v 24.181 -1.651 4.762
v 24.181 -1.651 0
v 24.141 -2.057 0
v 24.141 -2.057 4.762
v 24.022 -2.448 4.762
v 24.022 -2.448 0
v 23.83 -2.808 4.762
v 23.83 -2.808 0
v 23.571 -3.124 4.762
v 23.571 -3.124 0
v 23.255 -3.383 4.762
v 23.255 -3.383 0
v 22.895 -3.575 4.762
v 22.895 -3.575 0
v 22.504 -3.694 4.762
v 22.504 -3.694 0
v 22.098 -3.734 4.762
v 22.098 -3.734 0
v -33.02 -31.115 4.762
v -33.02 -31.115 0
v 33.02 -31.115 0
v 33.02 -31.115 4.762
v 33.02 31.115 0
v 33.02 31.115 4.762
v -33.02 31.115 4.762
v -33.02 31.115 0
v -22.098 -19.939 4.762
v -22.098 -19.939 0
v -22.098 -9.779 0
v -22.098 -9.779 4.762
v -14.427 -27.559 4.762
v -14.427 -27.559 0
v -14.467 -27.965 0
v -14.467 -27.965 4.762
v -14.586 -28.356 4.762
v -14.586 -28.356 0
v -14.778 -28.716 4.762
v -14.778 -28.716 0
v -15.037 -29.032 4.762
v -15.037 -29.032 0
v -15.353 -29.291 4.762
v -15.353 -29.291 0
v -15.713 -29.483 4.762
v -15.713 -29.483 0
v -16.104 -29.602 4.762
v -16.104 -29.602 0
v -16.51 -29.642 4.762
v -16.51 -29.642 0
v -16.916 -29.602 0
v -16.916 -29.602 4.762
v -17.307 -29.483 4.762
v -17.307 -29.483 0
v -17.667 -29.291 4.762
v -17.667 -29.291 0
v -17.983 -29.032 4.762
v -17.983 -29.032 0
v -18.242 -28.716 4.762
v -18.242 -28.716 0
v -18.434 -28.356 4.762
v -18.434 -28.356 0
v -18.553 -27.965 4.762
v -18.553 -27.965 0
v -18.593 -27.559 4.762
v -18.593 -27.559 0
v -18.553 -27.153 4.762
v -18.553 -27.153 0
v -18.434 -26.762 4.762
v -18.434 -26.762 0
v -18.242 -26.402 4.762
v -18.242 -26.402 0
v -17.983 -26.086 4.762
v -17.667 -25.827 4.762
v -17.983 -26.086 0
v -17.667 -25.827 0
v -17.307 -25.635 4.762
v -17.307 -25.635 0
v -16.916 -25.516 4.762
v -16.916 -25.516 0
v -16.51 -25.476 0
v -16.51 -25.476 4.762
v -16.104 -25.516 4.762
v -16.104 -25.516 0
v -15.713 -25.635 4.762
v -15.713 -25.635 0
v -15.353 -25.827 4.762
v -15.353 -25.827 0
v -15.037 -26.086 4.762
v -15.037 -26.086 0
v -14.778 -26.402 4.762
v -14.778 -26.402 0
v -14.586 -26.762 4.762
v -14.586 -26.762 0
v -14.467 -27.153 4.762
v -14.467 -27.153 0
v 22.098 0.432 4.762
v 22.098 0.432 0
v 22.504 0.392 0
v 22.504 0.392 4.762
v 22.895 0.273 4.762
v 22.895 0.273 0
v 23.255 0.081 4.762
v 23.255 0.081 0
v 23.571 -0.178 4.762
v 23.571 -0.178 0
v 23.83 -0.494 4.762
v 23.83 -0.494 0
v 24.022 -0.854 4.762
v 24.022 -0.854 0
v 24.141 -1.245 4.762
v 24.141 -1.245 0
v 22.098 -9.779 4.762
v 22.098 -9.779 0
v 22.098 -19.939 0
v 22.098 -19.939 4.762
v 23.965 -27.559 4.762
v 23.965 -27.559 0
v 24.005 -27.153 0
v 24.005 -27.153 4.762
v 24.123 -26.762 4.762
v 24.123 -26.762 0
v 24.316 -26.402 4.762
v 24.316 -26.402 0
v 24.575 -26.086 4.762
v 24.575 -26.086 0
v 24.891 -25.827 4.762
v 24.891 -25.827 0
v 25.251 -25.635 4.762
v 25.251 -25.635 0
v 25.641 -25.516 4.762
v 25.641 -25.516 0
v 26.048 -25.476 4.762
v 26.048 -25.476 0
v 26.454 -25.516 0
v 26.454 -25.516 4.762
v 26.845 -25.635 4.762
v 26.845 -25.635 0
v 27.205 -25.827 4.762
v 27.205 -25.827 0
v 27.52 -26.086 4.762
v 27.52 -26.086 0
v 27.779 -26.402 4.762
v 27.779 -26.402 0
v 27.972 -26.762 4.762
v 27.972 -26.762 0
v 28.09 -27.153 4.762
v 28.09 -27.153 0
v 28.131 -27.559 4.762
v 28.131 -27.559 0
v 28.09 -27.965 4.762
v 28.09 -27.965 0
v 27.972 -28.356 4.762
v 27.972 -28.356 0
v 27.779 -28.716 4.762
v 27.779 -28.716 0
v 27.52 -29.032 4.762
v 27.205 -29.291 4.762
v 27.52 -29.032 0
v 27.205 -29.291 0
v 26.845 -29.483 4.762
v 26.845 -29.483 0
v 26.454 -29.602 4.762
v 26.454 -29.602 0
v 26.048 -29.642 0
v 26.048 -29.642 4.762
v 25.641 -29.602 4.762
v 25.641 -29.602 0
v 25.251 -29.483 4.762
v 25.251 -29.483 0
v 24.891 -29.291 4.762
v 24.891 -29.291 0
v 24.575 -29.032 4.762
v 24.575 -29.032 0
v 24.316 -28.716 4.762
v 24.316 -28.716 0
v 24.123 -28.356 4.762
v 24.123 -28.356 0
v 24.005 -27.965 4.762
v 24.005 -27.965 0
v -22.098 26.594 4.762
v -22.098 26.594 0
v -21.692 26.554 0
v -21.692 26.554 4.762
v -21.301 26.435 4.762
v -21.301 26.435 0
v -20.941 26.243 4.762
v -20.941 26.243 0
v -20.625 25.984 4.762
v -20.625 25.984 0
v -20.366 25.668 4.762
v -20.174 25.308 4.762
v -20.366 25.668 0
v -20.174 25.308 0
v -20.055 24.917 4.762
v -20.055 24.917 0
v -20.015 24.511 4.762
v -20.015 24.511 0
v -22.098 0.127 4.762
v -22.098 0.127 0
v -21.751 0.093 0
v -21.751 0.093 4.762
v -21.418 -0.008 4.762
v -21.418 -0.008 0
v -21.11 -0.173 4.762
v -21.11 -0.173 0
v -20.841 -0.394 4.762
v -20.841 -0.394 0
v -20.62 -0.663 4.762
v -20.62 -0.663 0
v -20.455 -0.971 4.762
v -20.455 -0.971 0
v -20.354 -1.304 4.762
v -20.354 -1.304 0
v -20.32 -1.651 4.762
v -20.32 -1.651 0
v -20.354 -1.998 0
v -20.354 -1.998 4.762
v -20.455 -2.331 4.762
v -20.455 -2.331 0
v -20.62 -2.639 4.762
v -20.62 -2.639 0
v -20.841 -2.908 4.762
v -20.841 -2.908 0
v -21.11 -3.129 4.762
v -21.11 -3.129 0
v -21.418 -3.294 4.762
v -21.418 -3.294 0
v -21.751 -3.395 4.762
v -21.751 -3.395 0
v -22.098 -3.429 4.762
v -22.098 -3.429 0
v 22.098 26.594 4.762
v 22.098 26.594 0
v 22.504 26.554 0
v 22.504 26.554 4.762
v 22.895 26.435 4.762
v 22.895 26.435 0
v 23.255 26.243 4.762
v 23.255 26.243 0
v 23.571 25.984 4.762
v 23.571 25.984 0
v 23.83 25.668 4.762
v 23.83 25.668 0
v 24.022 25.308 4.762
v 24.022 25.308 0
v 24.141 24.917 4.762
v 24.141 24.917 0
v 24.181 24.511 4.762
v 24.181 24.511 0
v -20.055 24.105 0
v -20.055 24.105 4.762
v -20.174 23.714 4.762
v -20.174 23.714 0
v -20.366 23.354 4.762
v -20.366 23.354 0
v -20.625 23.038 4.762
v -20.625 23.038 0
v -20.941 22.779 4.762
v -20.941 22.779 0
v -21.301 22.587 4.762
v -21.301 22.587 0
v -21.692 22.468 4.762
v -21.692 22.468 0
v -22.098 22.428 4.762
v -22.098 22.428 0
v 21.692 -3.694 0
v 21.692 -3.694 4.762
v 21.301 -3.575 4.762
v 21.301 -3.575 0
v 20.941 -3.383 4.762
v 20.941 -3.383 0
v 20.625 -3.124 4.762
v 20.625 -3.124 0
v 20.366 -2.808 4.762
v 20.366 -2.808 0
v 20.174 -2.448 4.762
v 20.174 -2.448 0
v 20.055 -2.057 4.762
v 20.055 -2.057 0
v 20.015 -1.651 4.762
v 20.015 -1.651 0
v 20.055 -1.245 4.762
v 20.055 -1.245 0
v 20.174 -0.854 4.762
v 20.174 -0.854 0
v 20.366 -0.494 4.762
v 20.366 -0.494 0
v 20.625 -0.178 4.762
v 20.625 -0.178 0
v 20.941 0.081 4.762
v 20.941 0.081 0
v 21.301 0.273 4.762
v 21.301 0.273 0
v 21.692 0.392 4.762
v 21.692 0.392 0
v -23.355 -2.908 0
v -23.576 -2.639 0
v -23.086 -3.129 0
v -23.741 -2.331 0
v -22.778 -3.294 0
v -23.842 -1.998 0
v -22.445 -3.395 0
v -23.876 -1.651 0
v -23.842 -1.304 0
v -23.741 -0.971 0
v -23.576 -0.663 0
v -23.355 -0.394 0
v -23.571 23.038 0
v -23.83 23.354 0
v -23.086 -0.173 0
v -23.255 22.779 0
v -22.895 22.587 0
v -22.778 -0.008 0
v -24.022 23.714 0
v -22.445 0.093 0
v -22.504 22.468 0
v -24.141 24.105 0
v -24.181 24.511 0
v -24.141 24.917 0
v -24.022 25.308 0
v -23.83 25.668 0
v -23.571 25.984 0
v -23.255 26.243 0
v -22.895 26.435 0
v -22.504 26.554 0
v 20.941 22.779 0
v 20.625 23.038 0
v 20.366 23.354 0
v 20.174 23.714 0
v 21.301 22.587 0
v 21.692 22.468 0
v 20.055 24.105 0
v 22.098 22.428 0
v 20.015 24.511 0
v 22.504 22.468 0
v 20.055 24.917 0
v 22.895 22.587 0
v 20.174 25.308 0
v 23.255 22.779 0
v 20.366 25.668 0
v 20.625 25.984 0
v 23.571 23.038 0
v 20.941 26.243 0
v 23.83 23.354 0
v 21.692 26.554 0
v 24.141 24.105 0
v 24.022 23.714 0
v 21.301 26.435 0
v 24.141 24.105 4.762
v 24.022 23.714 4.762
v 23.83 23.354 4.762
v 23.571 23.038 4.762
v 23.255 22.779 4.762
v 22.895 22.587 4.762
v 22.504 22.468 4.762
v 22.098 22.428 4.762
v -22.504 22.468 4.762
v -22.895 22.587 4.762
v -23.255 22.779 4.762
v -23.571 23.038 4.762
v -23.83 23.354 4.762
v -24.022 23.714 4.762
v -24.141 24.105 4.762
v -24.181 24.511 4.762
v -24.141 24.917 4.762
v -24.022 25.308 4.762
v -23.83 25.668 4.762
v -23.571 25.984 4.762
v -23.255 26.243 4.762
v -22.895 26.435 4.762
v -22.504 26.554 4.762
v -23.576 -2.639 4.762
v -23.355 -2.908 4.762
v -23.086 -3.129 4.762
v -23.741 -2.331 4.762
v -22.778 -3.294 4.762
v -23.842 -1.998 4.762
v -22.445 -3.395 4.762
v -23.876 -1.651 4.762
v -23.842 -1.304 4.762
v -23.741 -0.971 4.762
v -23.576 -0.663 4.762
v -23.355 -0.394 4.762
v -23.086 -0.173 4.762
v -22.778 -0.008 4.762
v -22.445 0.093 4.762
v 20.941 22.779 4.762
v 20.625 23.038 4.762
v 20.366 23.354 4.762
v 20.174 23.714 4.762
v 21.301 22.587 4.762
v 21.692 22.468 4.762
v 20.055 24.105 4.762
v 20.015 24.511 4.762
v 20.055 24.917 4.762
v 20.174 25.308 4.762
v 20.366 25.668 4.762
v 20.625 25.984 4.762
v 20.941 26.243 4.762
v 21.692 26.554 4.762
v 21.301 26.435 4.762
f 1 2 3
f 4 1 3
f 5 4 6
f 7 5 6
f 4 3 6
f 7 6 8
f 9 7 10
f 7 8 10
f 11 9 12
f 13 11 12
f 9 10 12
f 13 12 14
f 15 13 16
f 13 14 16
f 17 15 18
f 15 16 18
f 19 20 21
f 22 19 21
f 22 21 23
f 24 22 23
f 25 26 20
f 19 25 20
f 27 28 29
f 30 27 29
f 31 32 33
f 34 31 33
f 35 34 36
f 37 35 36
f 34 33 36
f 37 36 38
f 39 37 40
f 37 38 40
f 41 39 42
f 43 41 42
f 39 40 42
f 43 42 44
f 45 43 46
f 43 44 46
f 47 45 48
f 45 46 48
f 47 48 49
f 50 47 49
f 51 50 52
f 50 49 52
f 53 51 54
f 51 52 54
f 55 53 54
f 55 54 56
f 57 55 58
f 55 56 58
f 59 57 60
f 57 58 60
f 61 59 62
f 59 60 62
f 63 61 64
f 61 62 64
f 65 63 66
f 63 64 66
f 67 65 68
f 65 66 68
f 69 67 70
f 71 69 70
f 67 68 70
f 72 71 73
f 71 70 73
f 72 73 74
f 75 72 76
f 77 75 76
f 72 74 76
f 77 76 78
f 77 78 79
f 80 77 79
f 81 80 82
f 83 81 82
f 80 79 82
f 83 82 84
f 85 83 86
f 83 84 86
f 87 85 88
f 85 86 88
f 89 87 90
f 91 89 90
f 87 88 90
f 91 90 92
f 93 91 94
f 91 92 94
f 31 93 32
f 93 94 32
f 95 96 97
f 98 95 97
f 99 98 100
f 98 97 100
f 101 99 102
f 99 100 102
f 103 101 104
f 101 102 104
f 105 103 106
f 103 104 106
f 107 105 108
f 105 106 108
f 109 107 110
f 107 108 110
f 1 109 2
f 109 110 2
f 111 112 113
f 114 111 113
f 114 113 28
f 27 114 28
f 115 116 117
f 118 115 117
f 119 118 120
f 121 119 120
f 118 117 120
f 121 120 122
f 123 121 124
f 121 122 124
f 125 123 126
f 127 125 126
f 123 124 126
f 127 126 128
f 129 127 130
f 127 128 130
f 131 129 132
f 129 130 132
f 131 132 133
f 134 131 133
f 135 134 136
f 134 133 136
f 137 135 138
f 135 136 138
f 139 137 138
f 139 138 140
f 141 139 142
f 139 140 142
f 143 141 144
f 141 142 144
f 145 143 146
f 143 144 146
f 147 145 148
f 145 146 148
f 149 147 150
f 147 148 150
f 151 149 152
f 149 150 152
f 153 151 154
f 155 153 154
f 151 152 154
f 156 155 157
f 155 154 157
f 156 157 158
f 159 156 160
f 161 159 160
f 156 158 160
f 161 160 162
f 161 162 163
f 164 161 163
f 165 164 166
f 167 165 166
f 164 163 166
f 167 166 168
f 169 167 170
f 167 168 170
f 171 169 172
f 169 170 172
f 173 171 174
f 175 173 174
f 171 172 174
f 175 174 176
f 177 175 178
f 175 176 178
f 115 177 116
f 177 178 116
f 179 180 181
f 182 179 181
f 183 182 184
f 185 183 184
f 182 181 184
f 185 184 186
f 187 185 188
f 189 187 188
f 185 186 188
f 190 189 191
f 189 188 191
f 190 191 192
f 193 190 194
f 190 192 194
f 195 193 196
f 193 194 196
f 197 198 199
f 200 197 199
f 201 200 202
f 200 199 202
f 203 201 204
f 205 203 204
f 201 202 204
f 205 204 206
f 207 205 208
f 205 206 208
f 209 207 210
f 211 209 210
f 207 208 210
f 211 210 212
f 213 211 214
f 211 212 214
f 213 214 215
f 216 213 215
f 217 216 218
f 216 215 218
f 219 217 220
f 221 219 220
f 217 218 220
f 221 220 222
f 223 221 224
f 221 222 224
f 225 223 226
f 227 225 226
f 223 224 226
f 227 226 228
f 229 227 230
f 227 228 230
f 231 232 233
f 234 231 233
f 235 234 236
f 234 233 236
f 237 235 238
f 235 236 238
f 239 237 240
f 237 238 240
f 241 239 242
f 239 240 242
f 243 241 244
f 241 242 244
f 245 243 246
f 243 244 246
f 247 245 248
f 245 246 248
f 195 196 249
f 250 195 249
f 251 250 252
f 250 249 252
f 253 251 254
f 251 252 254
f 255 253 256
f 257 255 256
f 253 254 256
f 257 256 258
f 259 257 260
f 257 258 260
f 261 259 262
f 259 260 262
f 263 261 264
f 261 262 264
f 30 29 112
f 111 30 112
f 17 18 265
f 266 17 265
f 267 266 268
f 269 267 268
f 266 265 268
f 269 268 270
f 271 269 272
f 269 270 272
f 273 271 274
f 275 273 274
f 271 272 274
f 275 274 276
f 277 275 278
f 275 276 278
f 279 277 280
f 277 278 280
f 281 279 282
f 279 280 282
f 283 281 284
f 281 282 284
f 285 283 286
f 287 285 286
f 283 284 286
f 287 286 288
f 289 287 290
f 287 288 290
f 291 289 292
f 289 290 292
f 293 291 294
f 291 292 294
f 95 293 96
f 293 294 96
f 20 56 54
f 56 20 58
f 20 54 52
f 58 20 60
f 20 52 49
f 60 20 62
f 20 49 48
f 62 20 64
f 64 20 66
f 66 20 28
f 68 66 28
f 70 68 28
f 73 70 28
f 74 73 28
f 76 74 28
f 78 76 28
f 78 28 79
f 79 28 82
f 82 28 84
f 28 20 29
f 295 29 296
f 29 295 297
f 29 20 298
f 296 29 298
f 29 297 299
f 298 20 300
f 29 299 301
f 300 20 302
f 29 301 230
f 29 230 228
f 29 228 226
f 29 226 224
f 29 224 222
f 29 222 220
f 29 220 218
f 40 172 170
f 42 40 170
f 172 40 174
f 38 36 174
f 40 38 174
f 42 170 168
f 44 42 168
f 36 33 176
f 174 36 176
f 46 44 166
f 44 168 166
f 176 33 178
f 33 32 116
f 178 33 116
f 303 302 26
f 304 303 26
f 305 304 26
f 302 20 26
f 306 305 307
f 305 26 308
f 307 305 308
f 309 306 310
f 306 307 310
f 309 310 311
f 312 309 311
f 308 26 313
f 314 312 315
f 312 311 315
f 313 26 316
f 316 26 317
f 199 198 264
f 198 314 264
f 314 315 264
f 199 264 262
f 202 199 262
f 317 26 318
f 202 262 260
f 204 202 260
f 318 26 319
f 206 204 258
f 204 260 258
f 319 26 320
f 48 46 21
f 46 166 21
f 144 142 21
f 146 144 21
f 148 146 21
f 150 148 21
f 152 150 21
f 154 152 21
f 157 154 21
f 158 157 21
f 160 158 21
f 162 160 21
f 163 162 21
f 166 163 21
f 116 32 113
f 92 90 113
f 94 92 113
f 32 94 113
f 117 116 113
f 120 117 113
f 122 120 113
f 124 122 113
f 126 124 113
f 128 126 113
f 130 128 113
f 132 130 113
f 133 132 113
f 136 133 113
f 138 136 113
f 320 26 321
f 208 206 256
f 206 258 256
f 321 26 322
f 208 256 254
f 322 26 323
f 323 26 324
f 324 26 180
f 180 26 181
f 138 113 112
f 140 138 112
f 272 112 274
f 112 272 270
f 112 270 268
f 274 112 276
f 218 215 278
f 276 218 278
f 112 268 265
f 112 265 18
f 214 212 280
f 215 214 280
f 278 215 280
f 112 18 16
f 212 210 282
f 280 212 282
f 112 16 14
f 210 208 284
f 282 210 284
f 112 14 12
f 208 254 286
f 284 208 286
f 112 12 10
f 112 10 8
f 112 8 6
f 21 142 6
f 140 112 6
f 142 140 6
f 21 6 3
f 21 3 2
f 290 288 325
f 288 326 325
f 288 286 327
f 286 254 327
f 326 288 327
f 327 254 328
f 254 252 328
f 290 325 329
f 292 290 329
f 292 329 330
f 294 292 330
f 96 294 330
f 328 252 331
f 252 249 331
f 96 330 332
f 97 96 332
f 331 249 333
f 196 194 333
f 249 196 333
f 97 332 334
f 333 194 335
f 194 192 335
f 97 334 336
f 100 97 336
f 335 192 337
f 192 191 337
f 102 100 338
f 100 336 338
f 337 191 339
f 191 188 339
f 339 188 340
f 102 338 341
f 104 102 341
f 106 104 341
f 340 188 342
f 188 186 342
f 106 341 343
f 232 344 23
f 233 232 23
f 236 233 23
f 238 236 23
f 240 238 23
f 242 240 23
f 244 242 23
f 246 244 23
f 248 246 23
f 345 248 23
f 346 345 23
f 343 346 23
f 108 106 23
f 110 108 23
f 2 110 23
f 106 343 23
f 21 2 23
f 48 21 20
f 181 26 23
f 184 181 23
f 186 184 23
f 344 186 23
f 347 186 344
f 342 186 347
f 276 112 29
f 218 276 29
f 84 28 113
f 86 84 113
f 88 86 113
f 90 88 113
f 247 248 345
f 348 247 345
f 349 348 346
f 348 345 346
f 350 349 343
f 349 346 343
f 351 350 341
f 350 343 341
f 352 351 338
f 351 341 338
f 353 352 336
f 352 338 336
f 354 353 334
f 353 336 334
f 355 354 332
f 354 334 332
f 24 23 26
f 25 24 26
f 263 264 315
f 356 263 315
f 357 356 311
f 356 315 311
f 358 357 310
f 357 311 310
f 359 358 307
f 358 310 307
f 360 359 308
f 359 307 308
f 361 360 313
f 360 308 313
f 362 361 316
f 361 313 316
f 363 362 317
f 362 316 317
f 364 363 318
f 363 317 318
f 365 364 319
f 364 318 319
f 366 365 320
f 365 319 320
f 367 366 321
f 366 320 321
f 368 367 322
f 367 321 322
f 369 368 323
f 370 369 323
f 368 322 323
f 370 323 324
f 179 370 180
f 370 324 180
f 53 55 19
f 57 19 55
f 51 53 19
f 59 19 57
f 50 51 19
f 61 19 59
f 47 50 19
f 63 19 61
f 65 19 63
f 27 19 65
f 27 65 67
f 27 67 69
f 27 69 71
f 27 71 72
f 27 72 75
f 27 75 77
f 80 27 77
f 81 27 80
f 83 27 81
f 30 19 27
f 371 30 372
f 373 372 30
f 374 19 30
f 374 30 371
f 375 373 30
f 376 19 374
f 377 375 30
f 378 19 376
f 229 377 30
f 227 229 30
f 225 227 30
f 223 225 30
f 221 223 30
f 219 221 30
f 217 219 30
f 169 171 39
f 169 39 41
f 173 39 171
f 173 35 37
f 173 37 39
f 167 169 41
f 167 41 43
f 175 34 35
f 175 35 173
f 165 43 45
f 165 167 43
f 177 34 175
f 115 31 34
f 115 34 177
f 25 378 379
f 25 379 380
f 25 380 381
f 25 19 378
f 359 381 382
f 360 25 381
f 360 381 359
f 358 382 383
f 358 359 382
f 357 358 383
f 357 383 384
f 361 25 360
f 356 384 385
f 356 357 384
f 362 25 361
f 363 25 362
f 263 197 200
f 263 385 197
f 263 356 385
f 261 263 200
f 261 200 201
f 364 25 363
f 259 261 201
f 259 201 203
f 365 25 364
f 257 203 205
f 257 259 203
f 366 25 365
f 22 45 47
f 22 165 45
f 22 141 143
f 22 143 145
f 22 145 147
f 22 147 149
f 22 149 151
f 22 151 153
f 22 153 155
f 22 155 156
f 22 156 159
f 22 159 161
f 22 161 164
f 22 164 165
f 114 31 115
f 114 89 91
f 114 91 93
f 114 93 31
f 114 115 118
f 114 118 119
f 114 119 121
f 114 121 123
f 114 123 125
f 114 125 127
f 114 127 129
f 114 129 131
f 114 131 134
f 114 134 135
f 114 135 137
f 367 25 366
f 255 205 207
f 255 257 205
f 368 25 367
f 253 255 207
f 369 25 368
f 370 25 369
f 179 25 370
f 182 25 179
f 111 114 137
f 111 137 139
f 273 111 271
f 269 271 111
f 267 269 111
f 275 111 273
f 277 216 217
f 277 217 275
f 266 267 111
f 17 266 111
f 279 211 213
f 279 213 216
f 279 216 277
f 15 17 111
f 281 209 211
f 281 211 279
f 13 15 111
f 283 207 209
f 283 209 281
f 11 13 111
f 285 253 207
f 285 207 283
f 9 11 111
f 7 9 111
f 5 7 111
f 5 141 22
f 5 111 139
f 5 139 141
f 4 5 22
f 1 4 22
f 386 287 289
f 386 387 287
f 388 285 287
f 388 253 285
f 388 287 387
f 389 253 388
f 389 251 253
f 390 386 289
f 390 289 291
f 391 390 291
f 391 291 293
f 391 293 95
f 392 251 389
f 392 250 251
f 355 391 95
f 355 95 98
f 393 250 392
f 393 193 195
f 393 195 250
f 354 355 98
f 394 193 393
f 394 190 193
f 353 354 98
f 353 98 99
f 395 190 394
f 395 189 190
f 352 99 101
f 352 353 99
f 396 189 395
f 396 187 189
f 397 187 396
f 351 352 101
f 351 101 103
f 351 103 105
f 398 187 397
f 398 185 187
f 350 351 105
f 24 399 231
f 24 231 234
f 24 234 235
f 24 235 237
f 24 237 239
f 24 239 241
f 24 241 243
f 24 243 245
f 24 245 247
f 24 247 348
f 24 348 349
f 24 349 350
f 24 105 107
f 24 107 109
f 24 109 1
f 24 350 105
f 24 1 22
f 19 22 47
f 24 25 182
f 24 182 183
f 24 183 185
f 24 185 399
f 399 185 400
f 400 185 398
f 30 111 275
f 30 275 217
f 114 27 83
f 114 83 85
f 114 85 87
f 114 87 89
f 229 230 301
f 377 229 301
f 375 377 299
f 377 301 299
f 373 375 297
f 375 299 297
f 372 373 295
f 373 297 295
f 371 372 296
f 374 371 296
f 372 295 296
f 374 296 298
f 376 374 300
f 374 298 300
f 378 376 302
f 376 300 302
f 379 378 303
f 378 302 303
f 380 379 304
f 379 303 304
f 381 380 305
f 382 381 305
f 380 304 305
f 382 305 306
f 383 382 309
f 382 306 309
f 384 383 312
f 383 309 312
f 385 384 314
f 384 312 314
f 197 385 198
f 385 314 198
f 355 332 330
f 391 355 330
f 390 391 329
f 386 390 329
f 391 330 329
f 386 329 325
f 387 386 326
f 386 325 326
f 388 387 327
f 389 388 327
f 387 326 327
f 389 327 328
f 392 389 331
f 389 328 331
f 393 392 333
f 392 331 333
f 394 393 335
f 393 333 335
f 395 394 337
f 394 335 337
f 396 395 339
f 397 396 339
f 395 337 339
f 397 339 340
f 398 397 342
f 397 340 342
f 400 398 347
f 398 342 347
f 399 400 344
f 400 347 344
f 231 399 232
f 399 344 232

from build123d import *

# Parameters (mm, degrees)
F1_DEPTH = 4.7625


# Not quite as in the source:
# - a length typed as a fraction of an inch, garbled in the dataset ("3 / 203.2 mm" for 3/8 in), is restored


with BuildPart() as f1:
    # F0 (on Top) → F1 (new body)
    with BuildSketch(Plane.XY):
        with BuildLine():
            Line((22.098, 26.5938), (22.098, 31.115))
            Line((22.098, 31.115), (0, 31.115))
            Line((0, 31.115), (-22.098, 31.115))
            Line((-22.098, 31.115), (-22.098, 26.5938))
            ThreePointArc((-22.098, 26.5938), (-20.6252379961, 25.9837620039), (-20.0152, 24.511))
            ThreePointArc((-20.0152, 24.511), (-20.6252379961, 23.0382379961), (-22.098, 22.4282))
            Line((-22.098, 22.4282), (-22.098, 0.127))
            ThreePointArc((-22.098, 0.127), (-20.8407641431, -0.3937641431), (-20.32, -1.651))
            ThreePointArc((-20.32, -1.651), (-20.8407641431, -2.9082358569), (-22.098, -3.429))
            Line((-22.098, -3.429), (-22.098, -9.779))
            Line((-22.098, -9.779), (22.098, -9.779))
            Line((22.098, -9.779), (22.098, -3.7338))
            ThreePointArc((22.098, -3.7338), (20.0152, -1.651), (22.098, 0.4318))
            Line((22.098, 0.4318), (22.098, 22.4282))
            ThreePointArc((22.098, 22.4282), (20.0152, 24.511), (22.098, 26.5938))
        make_face()
        with BuildLine():
            Line((-22.098, 26.5938), (-22.098, 31.115))
            Line((-22.098, 31.115), (-33.02, 31.115))
            Line((-33.02, 31.115), (-33.02, -31.115))
            Line((-33.02, -31.115), (-22.098, -31.115))
            Line((-22.098, -31.115), (-22.098, -27.559))
            Line((-22.098, -27.559), (-22.098, -19.939))
            Line((-22.098, -19.939), (-22.098, -9.779))
            Line((-22.098, -9.779), (-22.098, -3.429))
            ThreePointArc((-22.098, -3.429), (-23.876, -1.651), (-22.098, 0.127))
            Line((-22.098, 0.127), (-22.098, 22.4282))
            ThreePointArc((-22.098, 22.4282), (-24.1808, 24.511), (-22.098, 26.5938))
        make_face()
        with BuildLine():
            Line((33.02, -27.559), (33.02, 31.115))
            Line((33.02, 31.115), (22.098, 31.115))
            Line((22.098, 31.115), (22.098, 26.5938))
            ThreePointArc((22.098, 26.5938), (23.5707620039, 25.9837620039), (24.1808, 24.511))
            ThreePointArc((24.1808, 24.511), (23.5707620039, 23.0382379961), (22.098, 22.4282))
            Line((22.098, 22.4282), (22.098, 0.4318))
            ThreePointArc((22.098, 0.4318), (23.5707620039, -0.1782379961), (24.1808, -1.651))
            ThreePointArc((24.1808, -1.651), (23.5707620039, -3.1237620039), (22.098, -3.7338))
            Line((22.098, -3.7338), (22.098, -9.779))
            Line((22.098, -9.779), (22.098, -19.939))
            Line((22.098, -19.939), (22.098, -27.559))
            Line((22.098, -27.559), (23.9649, -27.559))
            ThreePointArc((23.9649, -27.559), (26.0477, -25.4762), (28.1305, -27.559))
            Line((28.1305, -27.559), (33.02, -27.559))
        make_face()
        with BuildLine():
            Line((33.02, -31.115), (33.02, -27.559))
            Line((33.02, -27.559), (28.1305, -27.559))
            ThreePointArc((28.1305, -27.559), (26.0477, -29.6418), (23.9649, -27.559))
            Line((23.9649, -27.559), (22.098, -27.559))
            Line((22.098, -27.559), (22.098, -31.115))
            Line((22.098, -31.115), (33.02, -31.115))
        make_face()
        with BuildLine():
            Line((-14.4272, -27.559), (22.098, -27.559))
            Line((22.098, -27.559), (22.098, -19.939))
            Line((22.098, -19.939), (-22.098, -19.939))
            Line((-22.098, -19.939), (-22.098, -27.559))
            Line((-22.098, -27.559), (-18.5928, -27.559))
            ThreePointArc((-18.5928, -27.559), (-16.51, -25.4762), (-14.4272, -27.559))
        make_face()
        with BuildLine():
            Line((-22.098, -31.115), (22.098, -31.115))
            Line((22.098, -31.115), (22.098, -27.559))
            Line((22.098, -27.559), (-14.4272, -27.559))
            ThreePointArc((-14.4272, -27.559), (-16.51, -29.6418), (-18.5928, -27.559))
            Line((-18.5928, -27.559), (-22.098, -27.559))
            Line((-22.098, -27.559), (-22.098, -31.115))
        make_face()
    extrude(amount=F1_DEPTH)


solid = f1.part
